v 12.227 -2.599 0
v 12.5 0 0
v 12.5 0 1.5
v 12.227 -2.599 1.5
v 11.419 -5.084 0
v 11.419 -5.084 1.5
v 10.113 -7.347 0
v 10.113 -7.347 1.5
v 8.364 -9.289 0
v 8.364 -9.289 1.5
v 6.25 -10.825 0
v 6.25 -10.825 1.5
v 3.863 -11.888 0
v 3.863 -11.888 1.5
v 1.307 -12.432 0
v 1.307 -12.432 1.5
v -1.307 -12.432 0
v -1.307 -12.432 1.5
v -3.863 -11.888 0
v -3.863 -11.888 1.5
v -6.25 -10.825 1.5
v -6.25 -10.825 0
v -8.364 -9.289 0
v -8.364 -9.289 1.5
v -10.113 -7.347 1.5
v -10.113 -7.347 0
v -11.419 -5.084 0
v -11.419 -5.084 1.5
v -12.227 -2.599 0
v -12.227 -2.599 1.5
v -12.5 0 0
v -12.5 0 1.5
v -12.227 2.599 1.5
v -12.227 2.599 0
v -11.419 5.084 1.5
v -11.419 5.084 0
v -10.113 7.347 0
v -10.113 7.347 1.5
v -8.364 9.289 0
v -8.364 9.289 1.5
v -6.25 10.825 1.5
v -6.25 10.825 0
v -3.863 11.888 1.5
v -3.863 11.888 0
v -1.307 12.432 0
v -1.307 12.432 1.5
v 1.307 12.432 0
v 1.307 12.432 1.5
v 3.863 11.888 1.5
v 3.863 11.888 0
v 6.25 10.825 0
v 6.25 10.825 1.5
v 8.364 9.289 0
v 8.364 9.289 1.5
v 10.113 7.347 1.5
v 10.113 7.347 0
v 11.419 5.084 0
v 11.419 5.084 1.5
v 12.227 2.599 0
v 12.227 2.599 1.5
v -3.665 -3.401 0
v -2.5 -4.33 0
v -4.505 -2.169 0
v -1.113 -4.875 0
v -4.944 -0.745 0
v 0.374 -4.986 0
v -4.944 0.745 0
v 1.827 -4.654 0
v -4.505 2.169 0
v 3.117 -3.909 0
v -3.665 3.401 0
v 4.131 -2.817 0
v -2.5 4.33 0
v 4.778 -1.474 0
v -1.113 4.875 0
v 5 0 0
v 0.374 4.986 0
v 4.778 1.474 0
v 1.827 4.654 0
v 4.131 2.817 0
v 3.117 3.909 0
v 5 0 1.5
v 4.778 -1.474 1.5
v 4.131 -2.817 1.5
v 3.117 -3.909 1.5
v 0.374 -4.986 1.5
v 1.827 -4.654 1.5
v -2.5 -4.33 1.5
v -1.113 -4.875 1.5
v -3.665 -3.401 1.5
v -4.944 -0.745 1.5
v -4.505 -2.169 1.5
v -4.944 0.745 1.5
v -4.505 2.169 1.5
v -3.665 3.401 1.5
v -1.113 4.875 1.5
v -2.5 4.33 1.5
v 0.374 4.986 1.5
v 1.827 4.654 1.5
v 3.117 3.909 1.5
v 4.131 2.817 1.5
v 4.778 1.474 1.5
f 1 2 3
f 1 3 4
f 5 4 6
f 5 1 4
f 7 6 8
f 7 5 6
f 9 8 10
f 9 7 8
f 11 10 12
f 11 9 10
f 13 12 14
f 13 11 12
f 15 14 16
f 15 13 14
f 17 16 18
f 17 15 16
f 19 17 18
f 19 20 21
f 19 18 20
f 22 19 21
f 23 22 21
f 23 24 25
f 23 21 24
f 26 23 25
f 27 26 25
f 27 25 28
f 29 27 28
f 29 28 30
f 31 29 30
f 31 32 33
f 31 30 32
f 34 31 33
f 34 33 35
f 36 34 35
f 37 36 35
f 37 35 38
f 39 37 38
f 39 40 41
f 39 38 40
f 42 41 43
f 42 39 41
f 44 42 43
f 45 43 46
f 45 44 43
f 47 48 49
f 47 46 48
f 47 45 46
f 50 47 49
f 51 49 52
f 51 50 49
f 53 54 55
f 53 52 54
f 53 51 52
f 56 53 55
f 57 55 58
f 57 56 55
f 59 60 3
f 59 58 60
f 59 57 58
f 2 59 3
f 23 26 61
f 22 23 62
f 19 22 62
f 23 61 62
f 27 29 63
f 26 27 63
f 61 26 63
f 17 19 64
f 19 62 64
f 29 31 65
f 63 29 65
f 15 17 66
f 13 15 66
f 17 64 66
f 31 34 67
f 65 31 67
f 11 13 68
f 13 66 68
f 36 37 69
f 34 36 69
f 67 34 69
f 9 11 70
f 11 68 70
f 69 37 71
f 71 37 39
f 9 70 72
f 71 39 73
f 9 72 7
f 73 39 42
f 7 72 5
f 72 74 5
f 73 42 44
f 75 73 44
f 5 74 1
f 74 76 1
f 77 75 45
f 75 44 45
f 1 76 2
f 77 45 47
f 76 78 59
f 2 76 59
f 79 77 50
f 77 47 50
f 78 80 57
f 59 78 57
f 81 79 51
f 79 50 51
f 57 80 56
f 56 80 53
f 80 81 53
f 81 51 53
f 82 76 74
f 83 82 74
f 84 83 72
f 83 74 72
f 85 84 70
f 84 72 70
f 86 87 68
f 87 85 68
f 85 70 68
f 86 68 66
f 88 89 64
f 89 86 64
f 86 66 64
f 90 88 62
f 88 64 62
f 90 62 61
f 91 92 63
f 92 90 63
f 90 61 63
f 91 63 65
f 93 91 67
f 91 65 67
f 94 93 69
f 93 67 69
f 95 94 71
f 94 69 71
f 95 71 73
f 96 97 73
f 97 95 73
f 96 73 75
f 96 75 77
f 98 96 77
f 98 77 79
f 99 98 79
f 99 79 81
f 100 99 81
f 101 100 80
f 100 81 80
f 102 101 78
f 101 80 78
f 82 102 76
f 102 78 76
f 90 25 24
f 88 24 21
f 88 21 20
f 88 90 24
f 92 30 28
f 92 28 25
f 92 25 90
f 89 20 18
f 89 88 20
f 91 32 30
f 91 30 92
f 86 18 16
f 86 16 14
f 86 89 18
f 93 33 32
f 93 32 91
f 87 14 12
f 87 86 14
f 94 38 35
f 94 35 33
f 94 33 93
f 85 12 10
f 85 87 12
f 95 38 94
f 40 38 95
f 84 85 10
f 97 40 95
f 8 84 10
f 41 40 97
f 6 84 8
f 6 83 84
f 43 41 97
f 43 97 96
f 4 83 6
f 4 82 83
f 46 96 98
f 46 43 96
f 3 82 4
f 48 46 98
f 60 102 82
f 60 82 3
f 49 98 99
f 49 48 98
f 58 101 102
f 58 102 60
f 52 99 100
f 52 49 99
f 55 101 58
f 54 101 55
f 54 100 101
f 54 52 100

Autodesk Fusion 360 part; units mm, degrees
sketch "Sketch1" plane through (0, 0, 0) normal (0, 0, 1) x (1, 0, 0)
  circle A0 centre (0, 0) radius 5
  circle A1 centre (0, 0) radius 12.5
  dimension "d1" = 10
  dimension "d2" = 25
extrude "Extrude1" add sketch "Sketch1" along normal blind 1.5 makes body 1
copy_body "Body->Comp1" bodies 1 removing the originals makes body 2 in component "M10x25x1.5 washer"
component "M10x25x1.5 washer" placed x (1, 0, 0) y (0, 1, 0) z (0, 0, 1) at (0, 0, 0)
